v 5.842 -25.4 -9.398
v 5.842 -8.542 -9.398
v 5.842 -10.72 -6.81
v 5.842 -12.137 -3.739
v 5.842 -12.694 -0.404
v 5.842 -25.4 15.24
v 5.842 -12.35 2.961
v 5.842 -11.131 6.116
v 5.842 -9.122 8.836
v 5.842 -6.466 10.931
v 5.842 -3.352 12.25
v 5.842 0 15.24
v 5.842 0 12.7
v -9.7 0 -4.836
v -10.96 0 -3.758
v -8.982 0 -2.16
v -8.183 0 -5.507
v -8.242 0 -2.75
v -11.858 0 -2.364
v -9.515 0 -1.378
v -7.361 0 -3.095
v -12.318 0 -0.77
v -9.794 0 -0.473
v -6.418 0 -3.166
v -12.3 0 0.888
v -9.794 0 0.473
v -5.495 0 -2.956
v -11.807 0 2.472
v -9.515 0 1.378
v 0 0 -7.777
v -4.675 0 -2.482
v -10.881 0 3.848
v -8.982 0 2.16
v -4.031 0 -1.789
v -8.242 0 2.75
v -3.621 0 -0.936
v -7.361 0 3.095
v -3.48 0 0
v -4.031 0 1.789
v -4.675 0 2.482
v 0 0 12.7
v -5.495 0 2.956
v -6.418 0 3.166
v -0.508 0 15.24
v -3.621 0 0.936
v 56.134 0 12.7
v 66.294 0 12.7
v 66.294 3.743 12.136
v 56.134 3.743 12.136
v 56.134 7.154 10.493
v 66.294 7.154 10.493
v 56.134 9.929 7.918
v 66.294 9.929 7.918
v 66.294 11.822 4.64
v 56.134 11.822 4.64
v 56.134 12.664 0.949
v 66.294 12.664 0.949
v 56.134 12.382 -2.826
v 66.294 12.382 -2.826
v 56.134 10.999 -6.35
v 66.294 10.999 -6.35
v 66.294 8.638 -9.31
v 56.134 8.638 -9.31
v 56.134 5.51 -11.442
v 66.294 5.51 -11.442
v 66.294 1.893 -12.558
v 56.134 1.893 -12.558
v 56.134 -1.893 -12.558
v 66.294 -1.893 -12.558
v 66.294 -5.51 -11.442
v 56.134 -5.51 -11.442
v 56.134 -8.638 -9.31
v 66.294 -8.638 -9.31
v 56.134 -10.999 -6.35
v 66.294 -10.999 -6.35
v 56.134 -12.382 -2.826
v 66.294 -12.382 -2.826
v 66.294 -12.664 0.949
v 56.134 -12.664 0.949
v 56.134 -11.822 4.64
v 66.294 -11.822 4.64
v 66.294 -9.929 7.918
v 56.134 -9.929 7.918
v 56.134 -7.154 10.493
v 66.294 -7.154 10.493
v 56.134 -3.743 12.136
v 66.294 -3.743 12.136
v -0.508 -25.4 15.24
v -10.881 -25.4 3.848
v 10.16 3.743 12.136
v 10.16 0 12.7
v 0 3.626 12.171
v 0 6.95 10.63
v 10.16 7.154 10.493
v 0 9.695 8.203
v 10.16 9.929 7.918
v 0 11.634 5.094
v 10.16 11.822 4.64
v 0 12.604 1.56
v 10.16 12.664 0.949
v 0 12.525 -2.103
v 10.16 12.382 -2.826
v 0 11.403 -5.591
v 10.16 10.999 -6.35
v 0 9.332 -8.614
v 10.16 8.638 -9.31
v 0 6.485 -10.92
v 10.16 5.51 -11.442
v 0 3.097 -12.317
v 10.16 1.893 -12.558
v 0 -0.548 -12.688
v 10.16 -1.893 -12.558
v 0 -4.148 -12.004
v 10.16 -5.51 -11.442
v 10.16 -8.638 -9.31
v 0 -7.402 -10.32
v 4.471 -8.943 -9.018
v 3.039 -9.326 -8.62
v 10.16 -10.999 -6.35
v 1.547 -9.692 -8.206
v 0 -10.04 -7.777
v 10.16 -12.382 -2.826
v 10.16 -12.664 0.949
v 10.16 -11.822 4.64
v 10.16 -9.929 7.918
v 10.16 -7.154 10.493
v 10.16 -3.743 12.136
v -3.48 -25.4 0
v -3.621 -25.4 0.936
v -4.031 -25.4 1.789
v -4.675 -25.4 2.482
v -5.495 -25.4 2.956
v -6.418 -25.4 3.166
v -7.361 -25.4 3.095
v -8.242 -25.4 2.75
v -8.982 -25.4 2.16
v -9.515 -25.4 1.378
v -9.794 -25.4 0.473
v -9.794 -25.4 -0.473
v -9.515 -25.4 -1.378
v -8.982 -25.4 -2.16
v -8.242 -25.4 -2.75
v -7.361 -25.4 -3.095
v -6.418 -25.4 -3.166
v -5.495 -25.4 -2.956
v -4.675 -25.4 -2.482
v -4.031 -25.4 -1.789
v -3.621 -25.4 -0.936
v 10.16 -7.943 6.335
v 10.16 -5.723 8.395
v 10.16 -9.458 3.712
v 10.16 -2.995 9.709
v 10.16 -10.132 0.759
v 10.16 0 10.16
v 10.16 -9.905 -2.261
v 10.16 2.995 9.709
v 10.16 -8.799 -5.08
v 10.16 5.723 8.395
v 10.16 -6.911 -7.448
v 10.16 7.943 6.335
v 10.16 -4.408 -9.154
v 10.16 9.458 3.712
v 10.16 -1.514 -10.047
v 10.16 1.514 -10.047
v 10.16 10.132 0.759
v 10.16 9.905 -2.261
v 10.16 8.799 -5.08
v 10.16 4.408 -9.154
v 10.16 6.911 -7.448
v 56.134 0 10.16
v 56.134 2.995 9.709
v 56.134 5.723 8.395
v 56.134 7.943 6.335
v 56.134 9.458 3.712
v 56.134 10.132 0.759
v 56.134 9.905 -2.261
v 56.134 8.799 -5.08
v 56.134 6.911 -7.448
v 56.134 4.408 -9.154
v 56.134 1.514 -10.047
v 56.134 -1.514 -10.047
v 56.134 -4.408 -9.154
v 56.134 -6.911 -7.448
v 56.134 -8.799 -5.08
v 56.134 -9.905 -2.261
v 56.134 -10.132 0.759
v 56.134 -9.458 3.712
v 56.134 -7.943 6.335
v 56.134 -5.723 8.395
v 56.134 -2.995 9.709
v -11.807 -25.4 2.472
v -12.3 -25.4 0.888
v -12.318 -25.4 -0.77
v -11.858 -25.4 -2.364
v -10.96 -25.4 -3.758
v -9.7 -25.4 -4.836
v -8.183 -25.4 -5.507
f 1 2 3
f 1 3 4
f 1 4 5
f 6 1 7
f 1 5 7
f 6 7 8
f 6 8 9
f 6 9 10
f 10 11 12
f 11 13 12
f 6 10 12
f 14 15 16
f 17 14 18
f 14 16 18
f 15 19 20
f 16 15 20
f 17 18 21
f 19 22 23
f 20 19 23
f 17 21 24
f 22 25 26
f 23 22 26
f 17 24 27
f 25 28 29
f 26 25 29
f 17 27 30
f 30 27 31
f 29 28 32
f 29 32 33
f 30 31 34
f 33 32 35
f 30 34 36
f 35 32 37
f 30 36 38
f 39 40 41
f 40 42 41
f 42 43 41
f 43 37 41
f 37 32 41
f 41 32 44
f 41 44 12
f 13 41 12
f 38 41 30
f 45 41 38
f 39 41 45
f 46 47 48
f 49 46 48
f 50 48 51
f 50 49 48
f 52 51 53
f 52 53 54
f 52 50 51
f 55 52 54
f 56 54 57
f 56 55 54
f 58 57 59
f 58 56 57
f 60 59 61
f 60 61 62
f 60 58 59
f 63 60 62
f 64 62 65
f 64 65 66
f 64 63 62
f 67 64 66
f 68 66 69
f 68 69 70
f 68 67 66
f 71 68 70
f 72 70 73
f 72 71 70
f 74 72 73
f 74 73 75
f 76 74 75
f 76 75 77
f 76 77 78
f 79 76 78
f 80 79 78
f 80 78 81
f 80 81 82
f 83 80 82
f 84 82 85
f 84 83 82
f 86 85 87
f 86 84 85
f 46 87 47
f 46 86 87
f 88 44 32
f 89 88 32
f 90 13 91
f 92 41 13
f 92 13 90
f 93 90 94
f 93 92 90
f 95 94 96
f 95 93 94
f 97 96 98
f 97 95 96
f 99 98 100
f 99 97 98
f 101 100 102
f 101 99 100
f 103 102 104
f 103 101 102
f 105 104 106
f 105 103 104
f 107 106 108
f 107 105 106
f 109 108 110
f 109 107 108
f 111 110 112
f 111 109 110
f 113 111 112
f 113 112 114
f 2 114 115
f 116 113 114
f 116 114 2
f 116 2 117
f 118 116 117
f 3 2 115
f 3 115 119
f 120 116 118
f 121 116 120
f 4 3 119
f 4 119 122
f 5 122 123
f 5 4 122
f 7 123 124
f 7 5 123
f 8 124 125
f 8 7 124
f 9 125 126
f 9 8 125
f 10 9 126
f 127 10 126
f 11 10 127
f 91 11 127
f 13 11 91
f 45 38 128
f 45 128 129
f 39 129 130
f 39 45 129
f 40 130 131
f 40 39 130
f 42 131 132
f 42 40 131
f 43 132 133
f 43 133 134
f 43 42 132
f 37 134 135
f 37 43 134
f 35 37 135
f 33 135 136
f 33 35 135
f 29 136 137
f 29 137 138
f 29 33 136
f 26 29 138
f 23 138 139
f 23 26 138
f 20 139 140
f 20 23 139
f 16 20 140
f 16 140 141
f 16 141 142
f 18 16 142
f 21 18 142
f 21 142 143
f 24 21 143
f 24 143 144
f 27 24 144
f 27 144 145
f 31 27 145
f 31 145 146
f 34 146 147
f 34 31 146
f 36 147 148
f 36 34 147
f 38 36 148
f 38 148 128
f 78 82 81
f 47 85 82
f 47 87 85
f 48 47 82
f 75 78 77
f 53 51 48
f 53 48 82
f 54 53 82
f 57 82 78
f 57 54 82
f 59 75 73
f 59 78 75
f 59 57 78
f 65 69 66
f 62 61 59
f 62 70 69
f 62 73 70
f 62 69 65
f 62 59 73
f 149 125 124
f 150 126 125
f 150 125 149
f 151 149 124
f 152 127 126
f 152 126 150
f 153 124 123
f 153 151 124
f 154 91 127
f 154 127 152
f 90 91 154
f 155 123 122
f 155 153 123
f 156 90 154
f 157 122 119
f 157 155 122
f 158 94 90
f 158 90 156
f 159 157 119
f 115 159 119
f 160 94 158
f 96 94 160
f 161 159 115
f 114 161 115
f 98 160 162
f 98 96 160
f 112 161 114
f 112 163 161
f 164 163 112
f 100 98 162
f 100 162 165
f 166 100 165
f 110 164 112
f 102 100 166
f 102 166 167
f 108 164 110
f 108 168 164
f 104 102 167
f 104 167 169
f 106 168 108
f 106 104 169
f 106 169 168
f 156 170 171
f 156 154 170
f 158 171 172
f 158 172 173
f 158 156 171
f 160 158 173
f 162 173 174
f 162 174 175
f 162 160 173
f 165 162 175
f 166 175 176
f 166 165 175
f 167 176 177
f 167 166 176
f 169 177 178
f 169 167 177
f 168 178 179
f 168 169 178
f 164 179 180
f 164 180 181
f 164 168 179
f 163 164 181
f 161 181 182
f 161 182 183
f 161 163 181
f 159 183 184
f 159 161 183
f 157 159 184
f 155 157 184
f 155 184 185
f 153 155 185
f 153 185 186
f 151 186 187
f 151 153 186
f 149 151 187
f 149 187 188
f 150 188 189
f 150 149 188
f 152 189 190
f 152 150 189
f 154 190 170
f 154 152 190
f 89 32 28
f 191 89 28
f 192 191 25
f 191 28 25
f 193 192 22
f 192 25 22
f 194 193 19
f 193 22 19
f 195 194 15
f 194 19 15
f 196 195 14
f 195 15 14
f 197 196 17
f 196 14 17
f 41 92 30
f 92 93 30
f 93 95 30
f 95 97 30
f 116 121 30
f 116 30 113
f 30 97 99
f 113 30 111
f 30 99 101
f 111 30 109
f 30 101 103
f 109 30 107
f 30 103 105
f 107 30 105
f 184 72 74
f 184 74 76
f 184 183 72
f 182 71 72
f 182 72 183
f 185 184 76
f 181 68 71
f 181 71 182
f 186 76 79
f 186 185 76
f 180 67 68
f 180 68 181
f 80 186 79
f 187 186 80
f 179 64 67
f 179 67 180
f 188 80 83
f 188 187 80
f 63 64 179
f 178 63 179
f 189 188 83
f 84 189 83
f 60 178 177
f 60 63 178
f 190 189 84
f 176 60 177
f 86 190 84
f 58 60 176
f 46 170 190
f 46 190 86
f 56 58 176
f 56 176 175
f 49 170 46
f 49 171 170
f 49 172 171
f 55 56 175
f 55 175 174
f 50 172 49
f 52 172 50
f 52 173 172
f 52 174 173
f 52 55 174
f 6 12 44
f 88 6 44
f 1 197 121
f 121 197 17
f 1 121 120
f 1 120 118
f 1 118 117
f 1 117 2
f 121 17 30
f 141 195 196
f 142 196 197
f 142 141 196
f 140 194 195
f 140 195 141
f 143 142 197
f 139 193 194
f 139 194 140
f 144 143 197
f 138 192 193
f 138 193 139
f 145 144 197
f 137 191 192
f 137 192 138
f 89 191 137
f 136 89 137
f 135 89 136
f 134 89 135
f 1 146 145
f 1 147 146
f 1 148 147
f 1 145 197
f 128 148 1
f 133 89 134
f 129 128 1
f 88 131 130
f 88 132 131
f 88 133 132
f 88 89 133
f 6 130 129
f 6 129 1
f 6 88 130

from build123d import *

# Parameters (mm, degrees)
F0_W     = 5.842
F0_H     = 12.7
F0_R     = 3.175
F2_DEPTH = 25.4


with BuildPart() as f1:
    # F0 (on Front) → F1 (revolve)
    with BuildSketch(Plane.XZ):
        with Locations((2.921, 6.35)):
            Rectangle(F0_W, F0_H)
        Polygon((5.842, 12.7), (5.842, 0), (66.294, 0), (66.294, 12.7), (56.134, 12.7), (56.134, 10.16), (10.16, 10.16), (10.16, 12.7), align=None)
    revolve(axis=Axis((33.147, 0, 0), (-1, 0, 0)))

    # F0 (on Front) → F2 (join)
    with BuildSketch(Plane.XZ):
        with BuildLine():
            Line((-0.9398, 0), (0, 0))
            Line((0, 0), (0, 12.7))
            Line((0, 12.7), (5.842, 12.7))
            Line((5.842, 12.7), (5.842, 15.24))
            Line((5.842, 15.24), (-0.508, 15.24))
            Line((-0.508, 15.24), (-10.88063, 3.847543))
            ThreePointArc((-10.88063, 3.847543), (-4.591961, 5.329721), (-0.9398, 0))
        make_face()
        with BuildLine():
            ThreePointArc((-8.182663, -5.506983), (-3.195791, -4.549339), (-0.9398, 0))
            ThreePointArc((-0.9398, 0), (-4.591961, 5.329721), (-10.88063, 3.847543))
            ThreePointArc((-10.88063, 3.847543), (-12.145978, -1.583727), (-8.182663, -5.506983))
        make_face()
        with Locations((-6.6548, 0)):
            Circle(F0_R, mode=Mode.SUBTRACT)
        with BuildLine():
            Line((5.842, 0), (0, 0))
            Line((0, 0), (-0.9398, 0))
            ThreePointArc((-0.9398, 0), (-3.195791, -4.549339), (-8.182663, -5.506983))
            Line((-8.182663, -5.506983), (5.842, -9.398))
            Line((5.842, -9.398), (5.842, 0))
        make_face()
        with Locations((2.921, 6.35)):
            Rectangle(F0_W, F0_H)
    extrude(amount=F2_DEPTH)


solid = f1.part
